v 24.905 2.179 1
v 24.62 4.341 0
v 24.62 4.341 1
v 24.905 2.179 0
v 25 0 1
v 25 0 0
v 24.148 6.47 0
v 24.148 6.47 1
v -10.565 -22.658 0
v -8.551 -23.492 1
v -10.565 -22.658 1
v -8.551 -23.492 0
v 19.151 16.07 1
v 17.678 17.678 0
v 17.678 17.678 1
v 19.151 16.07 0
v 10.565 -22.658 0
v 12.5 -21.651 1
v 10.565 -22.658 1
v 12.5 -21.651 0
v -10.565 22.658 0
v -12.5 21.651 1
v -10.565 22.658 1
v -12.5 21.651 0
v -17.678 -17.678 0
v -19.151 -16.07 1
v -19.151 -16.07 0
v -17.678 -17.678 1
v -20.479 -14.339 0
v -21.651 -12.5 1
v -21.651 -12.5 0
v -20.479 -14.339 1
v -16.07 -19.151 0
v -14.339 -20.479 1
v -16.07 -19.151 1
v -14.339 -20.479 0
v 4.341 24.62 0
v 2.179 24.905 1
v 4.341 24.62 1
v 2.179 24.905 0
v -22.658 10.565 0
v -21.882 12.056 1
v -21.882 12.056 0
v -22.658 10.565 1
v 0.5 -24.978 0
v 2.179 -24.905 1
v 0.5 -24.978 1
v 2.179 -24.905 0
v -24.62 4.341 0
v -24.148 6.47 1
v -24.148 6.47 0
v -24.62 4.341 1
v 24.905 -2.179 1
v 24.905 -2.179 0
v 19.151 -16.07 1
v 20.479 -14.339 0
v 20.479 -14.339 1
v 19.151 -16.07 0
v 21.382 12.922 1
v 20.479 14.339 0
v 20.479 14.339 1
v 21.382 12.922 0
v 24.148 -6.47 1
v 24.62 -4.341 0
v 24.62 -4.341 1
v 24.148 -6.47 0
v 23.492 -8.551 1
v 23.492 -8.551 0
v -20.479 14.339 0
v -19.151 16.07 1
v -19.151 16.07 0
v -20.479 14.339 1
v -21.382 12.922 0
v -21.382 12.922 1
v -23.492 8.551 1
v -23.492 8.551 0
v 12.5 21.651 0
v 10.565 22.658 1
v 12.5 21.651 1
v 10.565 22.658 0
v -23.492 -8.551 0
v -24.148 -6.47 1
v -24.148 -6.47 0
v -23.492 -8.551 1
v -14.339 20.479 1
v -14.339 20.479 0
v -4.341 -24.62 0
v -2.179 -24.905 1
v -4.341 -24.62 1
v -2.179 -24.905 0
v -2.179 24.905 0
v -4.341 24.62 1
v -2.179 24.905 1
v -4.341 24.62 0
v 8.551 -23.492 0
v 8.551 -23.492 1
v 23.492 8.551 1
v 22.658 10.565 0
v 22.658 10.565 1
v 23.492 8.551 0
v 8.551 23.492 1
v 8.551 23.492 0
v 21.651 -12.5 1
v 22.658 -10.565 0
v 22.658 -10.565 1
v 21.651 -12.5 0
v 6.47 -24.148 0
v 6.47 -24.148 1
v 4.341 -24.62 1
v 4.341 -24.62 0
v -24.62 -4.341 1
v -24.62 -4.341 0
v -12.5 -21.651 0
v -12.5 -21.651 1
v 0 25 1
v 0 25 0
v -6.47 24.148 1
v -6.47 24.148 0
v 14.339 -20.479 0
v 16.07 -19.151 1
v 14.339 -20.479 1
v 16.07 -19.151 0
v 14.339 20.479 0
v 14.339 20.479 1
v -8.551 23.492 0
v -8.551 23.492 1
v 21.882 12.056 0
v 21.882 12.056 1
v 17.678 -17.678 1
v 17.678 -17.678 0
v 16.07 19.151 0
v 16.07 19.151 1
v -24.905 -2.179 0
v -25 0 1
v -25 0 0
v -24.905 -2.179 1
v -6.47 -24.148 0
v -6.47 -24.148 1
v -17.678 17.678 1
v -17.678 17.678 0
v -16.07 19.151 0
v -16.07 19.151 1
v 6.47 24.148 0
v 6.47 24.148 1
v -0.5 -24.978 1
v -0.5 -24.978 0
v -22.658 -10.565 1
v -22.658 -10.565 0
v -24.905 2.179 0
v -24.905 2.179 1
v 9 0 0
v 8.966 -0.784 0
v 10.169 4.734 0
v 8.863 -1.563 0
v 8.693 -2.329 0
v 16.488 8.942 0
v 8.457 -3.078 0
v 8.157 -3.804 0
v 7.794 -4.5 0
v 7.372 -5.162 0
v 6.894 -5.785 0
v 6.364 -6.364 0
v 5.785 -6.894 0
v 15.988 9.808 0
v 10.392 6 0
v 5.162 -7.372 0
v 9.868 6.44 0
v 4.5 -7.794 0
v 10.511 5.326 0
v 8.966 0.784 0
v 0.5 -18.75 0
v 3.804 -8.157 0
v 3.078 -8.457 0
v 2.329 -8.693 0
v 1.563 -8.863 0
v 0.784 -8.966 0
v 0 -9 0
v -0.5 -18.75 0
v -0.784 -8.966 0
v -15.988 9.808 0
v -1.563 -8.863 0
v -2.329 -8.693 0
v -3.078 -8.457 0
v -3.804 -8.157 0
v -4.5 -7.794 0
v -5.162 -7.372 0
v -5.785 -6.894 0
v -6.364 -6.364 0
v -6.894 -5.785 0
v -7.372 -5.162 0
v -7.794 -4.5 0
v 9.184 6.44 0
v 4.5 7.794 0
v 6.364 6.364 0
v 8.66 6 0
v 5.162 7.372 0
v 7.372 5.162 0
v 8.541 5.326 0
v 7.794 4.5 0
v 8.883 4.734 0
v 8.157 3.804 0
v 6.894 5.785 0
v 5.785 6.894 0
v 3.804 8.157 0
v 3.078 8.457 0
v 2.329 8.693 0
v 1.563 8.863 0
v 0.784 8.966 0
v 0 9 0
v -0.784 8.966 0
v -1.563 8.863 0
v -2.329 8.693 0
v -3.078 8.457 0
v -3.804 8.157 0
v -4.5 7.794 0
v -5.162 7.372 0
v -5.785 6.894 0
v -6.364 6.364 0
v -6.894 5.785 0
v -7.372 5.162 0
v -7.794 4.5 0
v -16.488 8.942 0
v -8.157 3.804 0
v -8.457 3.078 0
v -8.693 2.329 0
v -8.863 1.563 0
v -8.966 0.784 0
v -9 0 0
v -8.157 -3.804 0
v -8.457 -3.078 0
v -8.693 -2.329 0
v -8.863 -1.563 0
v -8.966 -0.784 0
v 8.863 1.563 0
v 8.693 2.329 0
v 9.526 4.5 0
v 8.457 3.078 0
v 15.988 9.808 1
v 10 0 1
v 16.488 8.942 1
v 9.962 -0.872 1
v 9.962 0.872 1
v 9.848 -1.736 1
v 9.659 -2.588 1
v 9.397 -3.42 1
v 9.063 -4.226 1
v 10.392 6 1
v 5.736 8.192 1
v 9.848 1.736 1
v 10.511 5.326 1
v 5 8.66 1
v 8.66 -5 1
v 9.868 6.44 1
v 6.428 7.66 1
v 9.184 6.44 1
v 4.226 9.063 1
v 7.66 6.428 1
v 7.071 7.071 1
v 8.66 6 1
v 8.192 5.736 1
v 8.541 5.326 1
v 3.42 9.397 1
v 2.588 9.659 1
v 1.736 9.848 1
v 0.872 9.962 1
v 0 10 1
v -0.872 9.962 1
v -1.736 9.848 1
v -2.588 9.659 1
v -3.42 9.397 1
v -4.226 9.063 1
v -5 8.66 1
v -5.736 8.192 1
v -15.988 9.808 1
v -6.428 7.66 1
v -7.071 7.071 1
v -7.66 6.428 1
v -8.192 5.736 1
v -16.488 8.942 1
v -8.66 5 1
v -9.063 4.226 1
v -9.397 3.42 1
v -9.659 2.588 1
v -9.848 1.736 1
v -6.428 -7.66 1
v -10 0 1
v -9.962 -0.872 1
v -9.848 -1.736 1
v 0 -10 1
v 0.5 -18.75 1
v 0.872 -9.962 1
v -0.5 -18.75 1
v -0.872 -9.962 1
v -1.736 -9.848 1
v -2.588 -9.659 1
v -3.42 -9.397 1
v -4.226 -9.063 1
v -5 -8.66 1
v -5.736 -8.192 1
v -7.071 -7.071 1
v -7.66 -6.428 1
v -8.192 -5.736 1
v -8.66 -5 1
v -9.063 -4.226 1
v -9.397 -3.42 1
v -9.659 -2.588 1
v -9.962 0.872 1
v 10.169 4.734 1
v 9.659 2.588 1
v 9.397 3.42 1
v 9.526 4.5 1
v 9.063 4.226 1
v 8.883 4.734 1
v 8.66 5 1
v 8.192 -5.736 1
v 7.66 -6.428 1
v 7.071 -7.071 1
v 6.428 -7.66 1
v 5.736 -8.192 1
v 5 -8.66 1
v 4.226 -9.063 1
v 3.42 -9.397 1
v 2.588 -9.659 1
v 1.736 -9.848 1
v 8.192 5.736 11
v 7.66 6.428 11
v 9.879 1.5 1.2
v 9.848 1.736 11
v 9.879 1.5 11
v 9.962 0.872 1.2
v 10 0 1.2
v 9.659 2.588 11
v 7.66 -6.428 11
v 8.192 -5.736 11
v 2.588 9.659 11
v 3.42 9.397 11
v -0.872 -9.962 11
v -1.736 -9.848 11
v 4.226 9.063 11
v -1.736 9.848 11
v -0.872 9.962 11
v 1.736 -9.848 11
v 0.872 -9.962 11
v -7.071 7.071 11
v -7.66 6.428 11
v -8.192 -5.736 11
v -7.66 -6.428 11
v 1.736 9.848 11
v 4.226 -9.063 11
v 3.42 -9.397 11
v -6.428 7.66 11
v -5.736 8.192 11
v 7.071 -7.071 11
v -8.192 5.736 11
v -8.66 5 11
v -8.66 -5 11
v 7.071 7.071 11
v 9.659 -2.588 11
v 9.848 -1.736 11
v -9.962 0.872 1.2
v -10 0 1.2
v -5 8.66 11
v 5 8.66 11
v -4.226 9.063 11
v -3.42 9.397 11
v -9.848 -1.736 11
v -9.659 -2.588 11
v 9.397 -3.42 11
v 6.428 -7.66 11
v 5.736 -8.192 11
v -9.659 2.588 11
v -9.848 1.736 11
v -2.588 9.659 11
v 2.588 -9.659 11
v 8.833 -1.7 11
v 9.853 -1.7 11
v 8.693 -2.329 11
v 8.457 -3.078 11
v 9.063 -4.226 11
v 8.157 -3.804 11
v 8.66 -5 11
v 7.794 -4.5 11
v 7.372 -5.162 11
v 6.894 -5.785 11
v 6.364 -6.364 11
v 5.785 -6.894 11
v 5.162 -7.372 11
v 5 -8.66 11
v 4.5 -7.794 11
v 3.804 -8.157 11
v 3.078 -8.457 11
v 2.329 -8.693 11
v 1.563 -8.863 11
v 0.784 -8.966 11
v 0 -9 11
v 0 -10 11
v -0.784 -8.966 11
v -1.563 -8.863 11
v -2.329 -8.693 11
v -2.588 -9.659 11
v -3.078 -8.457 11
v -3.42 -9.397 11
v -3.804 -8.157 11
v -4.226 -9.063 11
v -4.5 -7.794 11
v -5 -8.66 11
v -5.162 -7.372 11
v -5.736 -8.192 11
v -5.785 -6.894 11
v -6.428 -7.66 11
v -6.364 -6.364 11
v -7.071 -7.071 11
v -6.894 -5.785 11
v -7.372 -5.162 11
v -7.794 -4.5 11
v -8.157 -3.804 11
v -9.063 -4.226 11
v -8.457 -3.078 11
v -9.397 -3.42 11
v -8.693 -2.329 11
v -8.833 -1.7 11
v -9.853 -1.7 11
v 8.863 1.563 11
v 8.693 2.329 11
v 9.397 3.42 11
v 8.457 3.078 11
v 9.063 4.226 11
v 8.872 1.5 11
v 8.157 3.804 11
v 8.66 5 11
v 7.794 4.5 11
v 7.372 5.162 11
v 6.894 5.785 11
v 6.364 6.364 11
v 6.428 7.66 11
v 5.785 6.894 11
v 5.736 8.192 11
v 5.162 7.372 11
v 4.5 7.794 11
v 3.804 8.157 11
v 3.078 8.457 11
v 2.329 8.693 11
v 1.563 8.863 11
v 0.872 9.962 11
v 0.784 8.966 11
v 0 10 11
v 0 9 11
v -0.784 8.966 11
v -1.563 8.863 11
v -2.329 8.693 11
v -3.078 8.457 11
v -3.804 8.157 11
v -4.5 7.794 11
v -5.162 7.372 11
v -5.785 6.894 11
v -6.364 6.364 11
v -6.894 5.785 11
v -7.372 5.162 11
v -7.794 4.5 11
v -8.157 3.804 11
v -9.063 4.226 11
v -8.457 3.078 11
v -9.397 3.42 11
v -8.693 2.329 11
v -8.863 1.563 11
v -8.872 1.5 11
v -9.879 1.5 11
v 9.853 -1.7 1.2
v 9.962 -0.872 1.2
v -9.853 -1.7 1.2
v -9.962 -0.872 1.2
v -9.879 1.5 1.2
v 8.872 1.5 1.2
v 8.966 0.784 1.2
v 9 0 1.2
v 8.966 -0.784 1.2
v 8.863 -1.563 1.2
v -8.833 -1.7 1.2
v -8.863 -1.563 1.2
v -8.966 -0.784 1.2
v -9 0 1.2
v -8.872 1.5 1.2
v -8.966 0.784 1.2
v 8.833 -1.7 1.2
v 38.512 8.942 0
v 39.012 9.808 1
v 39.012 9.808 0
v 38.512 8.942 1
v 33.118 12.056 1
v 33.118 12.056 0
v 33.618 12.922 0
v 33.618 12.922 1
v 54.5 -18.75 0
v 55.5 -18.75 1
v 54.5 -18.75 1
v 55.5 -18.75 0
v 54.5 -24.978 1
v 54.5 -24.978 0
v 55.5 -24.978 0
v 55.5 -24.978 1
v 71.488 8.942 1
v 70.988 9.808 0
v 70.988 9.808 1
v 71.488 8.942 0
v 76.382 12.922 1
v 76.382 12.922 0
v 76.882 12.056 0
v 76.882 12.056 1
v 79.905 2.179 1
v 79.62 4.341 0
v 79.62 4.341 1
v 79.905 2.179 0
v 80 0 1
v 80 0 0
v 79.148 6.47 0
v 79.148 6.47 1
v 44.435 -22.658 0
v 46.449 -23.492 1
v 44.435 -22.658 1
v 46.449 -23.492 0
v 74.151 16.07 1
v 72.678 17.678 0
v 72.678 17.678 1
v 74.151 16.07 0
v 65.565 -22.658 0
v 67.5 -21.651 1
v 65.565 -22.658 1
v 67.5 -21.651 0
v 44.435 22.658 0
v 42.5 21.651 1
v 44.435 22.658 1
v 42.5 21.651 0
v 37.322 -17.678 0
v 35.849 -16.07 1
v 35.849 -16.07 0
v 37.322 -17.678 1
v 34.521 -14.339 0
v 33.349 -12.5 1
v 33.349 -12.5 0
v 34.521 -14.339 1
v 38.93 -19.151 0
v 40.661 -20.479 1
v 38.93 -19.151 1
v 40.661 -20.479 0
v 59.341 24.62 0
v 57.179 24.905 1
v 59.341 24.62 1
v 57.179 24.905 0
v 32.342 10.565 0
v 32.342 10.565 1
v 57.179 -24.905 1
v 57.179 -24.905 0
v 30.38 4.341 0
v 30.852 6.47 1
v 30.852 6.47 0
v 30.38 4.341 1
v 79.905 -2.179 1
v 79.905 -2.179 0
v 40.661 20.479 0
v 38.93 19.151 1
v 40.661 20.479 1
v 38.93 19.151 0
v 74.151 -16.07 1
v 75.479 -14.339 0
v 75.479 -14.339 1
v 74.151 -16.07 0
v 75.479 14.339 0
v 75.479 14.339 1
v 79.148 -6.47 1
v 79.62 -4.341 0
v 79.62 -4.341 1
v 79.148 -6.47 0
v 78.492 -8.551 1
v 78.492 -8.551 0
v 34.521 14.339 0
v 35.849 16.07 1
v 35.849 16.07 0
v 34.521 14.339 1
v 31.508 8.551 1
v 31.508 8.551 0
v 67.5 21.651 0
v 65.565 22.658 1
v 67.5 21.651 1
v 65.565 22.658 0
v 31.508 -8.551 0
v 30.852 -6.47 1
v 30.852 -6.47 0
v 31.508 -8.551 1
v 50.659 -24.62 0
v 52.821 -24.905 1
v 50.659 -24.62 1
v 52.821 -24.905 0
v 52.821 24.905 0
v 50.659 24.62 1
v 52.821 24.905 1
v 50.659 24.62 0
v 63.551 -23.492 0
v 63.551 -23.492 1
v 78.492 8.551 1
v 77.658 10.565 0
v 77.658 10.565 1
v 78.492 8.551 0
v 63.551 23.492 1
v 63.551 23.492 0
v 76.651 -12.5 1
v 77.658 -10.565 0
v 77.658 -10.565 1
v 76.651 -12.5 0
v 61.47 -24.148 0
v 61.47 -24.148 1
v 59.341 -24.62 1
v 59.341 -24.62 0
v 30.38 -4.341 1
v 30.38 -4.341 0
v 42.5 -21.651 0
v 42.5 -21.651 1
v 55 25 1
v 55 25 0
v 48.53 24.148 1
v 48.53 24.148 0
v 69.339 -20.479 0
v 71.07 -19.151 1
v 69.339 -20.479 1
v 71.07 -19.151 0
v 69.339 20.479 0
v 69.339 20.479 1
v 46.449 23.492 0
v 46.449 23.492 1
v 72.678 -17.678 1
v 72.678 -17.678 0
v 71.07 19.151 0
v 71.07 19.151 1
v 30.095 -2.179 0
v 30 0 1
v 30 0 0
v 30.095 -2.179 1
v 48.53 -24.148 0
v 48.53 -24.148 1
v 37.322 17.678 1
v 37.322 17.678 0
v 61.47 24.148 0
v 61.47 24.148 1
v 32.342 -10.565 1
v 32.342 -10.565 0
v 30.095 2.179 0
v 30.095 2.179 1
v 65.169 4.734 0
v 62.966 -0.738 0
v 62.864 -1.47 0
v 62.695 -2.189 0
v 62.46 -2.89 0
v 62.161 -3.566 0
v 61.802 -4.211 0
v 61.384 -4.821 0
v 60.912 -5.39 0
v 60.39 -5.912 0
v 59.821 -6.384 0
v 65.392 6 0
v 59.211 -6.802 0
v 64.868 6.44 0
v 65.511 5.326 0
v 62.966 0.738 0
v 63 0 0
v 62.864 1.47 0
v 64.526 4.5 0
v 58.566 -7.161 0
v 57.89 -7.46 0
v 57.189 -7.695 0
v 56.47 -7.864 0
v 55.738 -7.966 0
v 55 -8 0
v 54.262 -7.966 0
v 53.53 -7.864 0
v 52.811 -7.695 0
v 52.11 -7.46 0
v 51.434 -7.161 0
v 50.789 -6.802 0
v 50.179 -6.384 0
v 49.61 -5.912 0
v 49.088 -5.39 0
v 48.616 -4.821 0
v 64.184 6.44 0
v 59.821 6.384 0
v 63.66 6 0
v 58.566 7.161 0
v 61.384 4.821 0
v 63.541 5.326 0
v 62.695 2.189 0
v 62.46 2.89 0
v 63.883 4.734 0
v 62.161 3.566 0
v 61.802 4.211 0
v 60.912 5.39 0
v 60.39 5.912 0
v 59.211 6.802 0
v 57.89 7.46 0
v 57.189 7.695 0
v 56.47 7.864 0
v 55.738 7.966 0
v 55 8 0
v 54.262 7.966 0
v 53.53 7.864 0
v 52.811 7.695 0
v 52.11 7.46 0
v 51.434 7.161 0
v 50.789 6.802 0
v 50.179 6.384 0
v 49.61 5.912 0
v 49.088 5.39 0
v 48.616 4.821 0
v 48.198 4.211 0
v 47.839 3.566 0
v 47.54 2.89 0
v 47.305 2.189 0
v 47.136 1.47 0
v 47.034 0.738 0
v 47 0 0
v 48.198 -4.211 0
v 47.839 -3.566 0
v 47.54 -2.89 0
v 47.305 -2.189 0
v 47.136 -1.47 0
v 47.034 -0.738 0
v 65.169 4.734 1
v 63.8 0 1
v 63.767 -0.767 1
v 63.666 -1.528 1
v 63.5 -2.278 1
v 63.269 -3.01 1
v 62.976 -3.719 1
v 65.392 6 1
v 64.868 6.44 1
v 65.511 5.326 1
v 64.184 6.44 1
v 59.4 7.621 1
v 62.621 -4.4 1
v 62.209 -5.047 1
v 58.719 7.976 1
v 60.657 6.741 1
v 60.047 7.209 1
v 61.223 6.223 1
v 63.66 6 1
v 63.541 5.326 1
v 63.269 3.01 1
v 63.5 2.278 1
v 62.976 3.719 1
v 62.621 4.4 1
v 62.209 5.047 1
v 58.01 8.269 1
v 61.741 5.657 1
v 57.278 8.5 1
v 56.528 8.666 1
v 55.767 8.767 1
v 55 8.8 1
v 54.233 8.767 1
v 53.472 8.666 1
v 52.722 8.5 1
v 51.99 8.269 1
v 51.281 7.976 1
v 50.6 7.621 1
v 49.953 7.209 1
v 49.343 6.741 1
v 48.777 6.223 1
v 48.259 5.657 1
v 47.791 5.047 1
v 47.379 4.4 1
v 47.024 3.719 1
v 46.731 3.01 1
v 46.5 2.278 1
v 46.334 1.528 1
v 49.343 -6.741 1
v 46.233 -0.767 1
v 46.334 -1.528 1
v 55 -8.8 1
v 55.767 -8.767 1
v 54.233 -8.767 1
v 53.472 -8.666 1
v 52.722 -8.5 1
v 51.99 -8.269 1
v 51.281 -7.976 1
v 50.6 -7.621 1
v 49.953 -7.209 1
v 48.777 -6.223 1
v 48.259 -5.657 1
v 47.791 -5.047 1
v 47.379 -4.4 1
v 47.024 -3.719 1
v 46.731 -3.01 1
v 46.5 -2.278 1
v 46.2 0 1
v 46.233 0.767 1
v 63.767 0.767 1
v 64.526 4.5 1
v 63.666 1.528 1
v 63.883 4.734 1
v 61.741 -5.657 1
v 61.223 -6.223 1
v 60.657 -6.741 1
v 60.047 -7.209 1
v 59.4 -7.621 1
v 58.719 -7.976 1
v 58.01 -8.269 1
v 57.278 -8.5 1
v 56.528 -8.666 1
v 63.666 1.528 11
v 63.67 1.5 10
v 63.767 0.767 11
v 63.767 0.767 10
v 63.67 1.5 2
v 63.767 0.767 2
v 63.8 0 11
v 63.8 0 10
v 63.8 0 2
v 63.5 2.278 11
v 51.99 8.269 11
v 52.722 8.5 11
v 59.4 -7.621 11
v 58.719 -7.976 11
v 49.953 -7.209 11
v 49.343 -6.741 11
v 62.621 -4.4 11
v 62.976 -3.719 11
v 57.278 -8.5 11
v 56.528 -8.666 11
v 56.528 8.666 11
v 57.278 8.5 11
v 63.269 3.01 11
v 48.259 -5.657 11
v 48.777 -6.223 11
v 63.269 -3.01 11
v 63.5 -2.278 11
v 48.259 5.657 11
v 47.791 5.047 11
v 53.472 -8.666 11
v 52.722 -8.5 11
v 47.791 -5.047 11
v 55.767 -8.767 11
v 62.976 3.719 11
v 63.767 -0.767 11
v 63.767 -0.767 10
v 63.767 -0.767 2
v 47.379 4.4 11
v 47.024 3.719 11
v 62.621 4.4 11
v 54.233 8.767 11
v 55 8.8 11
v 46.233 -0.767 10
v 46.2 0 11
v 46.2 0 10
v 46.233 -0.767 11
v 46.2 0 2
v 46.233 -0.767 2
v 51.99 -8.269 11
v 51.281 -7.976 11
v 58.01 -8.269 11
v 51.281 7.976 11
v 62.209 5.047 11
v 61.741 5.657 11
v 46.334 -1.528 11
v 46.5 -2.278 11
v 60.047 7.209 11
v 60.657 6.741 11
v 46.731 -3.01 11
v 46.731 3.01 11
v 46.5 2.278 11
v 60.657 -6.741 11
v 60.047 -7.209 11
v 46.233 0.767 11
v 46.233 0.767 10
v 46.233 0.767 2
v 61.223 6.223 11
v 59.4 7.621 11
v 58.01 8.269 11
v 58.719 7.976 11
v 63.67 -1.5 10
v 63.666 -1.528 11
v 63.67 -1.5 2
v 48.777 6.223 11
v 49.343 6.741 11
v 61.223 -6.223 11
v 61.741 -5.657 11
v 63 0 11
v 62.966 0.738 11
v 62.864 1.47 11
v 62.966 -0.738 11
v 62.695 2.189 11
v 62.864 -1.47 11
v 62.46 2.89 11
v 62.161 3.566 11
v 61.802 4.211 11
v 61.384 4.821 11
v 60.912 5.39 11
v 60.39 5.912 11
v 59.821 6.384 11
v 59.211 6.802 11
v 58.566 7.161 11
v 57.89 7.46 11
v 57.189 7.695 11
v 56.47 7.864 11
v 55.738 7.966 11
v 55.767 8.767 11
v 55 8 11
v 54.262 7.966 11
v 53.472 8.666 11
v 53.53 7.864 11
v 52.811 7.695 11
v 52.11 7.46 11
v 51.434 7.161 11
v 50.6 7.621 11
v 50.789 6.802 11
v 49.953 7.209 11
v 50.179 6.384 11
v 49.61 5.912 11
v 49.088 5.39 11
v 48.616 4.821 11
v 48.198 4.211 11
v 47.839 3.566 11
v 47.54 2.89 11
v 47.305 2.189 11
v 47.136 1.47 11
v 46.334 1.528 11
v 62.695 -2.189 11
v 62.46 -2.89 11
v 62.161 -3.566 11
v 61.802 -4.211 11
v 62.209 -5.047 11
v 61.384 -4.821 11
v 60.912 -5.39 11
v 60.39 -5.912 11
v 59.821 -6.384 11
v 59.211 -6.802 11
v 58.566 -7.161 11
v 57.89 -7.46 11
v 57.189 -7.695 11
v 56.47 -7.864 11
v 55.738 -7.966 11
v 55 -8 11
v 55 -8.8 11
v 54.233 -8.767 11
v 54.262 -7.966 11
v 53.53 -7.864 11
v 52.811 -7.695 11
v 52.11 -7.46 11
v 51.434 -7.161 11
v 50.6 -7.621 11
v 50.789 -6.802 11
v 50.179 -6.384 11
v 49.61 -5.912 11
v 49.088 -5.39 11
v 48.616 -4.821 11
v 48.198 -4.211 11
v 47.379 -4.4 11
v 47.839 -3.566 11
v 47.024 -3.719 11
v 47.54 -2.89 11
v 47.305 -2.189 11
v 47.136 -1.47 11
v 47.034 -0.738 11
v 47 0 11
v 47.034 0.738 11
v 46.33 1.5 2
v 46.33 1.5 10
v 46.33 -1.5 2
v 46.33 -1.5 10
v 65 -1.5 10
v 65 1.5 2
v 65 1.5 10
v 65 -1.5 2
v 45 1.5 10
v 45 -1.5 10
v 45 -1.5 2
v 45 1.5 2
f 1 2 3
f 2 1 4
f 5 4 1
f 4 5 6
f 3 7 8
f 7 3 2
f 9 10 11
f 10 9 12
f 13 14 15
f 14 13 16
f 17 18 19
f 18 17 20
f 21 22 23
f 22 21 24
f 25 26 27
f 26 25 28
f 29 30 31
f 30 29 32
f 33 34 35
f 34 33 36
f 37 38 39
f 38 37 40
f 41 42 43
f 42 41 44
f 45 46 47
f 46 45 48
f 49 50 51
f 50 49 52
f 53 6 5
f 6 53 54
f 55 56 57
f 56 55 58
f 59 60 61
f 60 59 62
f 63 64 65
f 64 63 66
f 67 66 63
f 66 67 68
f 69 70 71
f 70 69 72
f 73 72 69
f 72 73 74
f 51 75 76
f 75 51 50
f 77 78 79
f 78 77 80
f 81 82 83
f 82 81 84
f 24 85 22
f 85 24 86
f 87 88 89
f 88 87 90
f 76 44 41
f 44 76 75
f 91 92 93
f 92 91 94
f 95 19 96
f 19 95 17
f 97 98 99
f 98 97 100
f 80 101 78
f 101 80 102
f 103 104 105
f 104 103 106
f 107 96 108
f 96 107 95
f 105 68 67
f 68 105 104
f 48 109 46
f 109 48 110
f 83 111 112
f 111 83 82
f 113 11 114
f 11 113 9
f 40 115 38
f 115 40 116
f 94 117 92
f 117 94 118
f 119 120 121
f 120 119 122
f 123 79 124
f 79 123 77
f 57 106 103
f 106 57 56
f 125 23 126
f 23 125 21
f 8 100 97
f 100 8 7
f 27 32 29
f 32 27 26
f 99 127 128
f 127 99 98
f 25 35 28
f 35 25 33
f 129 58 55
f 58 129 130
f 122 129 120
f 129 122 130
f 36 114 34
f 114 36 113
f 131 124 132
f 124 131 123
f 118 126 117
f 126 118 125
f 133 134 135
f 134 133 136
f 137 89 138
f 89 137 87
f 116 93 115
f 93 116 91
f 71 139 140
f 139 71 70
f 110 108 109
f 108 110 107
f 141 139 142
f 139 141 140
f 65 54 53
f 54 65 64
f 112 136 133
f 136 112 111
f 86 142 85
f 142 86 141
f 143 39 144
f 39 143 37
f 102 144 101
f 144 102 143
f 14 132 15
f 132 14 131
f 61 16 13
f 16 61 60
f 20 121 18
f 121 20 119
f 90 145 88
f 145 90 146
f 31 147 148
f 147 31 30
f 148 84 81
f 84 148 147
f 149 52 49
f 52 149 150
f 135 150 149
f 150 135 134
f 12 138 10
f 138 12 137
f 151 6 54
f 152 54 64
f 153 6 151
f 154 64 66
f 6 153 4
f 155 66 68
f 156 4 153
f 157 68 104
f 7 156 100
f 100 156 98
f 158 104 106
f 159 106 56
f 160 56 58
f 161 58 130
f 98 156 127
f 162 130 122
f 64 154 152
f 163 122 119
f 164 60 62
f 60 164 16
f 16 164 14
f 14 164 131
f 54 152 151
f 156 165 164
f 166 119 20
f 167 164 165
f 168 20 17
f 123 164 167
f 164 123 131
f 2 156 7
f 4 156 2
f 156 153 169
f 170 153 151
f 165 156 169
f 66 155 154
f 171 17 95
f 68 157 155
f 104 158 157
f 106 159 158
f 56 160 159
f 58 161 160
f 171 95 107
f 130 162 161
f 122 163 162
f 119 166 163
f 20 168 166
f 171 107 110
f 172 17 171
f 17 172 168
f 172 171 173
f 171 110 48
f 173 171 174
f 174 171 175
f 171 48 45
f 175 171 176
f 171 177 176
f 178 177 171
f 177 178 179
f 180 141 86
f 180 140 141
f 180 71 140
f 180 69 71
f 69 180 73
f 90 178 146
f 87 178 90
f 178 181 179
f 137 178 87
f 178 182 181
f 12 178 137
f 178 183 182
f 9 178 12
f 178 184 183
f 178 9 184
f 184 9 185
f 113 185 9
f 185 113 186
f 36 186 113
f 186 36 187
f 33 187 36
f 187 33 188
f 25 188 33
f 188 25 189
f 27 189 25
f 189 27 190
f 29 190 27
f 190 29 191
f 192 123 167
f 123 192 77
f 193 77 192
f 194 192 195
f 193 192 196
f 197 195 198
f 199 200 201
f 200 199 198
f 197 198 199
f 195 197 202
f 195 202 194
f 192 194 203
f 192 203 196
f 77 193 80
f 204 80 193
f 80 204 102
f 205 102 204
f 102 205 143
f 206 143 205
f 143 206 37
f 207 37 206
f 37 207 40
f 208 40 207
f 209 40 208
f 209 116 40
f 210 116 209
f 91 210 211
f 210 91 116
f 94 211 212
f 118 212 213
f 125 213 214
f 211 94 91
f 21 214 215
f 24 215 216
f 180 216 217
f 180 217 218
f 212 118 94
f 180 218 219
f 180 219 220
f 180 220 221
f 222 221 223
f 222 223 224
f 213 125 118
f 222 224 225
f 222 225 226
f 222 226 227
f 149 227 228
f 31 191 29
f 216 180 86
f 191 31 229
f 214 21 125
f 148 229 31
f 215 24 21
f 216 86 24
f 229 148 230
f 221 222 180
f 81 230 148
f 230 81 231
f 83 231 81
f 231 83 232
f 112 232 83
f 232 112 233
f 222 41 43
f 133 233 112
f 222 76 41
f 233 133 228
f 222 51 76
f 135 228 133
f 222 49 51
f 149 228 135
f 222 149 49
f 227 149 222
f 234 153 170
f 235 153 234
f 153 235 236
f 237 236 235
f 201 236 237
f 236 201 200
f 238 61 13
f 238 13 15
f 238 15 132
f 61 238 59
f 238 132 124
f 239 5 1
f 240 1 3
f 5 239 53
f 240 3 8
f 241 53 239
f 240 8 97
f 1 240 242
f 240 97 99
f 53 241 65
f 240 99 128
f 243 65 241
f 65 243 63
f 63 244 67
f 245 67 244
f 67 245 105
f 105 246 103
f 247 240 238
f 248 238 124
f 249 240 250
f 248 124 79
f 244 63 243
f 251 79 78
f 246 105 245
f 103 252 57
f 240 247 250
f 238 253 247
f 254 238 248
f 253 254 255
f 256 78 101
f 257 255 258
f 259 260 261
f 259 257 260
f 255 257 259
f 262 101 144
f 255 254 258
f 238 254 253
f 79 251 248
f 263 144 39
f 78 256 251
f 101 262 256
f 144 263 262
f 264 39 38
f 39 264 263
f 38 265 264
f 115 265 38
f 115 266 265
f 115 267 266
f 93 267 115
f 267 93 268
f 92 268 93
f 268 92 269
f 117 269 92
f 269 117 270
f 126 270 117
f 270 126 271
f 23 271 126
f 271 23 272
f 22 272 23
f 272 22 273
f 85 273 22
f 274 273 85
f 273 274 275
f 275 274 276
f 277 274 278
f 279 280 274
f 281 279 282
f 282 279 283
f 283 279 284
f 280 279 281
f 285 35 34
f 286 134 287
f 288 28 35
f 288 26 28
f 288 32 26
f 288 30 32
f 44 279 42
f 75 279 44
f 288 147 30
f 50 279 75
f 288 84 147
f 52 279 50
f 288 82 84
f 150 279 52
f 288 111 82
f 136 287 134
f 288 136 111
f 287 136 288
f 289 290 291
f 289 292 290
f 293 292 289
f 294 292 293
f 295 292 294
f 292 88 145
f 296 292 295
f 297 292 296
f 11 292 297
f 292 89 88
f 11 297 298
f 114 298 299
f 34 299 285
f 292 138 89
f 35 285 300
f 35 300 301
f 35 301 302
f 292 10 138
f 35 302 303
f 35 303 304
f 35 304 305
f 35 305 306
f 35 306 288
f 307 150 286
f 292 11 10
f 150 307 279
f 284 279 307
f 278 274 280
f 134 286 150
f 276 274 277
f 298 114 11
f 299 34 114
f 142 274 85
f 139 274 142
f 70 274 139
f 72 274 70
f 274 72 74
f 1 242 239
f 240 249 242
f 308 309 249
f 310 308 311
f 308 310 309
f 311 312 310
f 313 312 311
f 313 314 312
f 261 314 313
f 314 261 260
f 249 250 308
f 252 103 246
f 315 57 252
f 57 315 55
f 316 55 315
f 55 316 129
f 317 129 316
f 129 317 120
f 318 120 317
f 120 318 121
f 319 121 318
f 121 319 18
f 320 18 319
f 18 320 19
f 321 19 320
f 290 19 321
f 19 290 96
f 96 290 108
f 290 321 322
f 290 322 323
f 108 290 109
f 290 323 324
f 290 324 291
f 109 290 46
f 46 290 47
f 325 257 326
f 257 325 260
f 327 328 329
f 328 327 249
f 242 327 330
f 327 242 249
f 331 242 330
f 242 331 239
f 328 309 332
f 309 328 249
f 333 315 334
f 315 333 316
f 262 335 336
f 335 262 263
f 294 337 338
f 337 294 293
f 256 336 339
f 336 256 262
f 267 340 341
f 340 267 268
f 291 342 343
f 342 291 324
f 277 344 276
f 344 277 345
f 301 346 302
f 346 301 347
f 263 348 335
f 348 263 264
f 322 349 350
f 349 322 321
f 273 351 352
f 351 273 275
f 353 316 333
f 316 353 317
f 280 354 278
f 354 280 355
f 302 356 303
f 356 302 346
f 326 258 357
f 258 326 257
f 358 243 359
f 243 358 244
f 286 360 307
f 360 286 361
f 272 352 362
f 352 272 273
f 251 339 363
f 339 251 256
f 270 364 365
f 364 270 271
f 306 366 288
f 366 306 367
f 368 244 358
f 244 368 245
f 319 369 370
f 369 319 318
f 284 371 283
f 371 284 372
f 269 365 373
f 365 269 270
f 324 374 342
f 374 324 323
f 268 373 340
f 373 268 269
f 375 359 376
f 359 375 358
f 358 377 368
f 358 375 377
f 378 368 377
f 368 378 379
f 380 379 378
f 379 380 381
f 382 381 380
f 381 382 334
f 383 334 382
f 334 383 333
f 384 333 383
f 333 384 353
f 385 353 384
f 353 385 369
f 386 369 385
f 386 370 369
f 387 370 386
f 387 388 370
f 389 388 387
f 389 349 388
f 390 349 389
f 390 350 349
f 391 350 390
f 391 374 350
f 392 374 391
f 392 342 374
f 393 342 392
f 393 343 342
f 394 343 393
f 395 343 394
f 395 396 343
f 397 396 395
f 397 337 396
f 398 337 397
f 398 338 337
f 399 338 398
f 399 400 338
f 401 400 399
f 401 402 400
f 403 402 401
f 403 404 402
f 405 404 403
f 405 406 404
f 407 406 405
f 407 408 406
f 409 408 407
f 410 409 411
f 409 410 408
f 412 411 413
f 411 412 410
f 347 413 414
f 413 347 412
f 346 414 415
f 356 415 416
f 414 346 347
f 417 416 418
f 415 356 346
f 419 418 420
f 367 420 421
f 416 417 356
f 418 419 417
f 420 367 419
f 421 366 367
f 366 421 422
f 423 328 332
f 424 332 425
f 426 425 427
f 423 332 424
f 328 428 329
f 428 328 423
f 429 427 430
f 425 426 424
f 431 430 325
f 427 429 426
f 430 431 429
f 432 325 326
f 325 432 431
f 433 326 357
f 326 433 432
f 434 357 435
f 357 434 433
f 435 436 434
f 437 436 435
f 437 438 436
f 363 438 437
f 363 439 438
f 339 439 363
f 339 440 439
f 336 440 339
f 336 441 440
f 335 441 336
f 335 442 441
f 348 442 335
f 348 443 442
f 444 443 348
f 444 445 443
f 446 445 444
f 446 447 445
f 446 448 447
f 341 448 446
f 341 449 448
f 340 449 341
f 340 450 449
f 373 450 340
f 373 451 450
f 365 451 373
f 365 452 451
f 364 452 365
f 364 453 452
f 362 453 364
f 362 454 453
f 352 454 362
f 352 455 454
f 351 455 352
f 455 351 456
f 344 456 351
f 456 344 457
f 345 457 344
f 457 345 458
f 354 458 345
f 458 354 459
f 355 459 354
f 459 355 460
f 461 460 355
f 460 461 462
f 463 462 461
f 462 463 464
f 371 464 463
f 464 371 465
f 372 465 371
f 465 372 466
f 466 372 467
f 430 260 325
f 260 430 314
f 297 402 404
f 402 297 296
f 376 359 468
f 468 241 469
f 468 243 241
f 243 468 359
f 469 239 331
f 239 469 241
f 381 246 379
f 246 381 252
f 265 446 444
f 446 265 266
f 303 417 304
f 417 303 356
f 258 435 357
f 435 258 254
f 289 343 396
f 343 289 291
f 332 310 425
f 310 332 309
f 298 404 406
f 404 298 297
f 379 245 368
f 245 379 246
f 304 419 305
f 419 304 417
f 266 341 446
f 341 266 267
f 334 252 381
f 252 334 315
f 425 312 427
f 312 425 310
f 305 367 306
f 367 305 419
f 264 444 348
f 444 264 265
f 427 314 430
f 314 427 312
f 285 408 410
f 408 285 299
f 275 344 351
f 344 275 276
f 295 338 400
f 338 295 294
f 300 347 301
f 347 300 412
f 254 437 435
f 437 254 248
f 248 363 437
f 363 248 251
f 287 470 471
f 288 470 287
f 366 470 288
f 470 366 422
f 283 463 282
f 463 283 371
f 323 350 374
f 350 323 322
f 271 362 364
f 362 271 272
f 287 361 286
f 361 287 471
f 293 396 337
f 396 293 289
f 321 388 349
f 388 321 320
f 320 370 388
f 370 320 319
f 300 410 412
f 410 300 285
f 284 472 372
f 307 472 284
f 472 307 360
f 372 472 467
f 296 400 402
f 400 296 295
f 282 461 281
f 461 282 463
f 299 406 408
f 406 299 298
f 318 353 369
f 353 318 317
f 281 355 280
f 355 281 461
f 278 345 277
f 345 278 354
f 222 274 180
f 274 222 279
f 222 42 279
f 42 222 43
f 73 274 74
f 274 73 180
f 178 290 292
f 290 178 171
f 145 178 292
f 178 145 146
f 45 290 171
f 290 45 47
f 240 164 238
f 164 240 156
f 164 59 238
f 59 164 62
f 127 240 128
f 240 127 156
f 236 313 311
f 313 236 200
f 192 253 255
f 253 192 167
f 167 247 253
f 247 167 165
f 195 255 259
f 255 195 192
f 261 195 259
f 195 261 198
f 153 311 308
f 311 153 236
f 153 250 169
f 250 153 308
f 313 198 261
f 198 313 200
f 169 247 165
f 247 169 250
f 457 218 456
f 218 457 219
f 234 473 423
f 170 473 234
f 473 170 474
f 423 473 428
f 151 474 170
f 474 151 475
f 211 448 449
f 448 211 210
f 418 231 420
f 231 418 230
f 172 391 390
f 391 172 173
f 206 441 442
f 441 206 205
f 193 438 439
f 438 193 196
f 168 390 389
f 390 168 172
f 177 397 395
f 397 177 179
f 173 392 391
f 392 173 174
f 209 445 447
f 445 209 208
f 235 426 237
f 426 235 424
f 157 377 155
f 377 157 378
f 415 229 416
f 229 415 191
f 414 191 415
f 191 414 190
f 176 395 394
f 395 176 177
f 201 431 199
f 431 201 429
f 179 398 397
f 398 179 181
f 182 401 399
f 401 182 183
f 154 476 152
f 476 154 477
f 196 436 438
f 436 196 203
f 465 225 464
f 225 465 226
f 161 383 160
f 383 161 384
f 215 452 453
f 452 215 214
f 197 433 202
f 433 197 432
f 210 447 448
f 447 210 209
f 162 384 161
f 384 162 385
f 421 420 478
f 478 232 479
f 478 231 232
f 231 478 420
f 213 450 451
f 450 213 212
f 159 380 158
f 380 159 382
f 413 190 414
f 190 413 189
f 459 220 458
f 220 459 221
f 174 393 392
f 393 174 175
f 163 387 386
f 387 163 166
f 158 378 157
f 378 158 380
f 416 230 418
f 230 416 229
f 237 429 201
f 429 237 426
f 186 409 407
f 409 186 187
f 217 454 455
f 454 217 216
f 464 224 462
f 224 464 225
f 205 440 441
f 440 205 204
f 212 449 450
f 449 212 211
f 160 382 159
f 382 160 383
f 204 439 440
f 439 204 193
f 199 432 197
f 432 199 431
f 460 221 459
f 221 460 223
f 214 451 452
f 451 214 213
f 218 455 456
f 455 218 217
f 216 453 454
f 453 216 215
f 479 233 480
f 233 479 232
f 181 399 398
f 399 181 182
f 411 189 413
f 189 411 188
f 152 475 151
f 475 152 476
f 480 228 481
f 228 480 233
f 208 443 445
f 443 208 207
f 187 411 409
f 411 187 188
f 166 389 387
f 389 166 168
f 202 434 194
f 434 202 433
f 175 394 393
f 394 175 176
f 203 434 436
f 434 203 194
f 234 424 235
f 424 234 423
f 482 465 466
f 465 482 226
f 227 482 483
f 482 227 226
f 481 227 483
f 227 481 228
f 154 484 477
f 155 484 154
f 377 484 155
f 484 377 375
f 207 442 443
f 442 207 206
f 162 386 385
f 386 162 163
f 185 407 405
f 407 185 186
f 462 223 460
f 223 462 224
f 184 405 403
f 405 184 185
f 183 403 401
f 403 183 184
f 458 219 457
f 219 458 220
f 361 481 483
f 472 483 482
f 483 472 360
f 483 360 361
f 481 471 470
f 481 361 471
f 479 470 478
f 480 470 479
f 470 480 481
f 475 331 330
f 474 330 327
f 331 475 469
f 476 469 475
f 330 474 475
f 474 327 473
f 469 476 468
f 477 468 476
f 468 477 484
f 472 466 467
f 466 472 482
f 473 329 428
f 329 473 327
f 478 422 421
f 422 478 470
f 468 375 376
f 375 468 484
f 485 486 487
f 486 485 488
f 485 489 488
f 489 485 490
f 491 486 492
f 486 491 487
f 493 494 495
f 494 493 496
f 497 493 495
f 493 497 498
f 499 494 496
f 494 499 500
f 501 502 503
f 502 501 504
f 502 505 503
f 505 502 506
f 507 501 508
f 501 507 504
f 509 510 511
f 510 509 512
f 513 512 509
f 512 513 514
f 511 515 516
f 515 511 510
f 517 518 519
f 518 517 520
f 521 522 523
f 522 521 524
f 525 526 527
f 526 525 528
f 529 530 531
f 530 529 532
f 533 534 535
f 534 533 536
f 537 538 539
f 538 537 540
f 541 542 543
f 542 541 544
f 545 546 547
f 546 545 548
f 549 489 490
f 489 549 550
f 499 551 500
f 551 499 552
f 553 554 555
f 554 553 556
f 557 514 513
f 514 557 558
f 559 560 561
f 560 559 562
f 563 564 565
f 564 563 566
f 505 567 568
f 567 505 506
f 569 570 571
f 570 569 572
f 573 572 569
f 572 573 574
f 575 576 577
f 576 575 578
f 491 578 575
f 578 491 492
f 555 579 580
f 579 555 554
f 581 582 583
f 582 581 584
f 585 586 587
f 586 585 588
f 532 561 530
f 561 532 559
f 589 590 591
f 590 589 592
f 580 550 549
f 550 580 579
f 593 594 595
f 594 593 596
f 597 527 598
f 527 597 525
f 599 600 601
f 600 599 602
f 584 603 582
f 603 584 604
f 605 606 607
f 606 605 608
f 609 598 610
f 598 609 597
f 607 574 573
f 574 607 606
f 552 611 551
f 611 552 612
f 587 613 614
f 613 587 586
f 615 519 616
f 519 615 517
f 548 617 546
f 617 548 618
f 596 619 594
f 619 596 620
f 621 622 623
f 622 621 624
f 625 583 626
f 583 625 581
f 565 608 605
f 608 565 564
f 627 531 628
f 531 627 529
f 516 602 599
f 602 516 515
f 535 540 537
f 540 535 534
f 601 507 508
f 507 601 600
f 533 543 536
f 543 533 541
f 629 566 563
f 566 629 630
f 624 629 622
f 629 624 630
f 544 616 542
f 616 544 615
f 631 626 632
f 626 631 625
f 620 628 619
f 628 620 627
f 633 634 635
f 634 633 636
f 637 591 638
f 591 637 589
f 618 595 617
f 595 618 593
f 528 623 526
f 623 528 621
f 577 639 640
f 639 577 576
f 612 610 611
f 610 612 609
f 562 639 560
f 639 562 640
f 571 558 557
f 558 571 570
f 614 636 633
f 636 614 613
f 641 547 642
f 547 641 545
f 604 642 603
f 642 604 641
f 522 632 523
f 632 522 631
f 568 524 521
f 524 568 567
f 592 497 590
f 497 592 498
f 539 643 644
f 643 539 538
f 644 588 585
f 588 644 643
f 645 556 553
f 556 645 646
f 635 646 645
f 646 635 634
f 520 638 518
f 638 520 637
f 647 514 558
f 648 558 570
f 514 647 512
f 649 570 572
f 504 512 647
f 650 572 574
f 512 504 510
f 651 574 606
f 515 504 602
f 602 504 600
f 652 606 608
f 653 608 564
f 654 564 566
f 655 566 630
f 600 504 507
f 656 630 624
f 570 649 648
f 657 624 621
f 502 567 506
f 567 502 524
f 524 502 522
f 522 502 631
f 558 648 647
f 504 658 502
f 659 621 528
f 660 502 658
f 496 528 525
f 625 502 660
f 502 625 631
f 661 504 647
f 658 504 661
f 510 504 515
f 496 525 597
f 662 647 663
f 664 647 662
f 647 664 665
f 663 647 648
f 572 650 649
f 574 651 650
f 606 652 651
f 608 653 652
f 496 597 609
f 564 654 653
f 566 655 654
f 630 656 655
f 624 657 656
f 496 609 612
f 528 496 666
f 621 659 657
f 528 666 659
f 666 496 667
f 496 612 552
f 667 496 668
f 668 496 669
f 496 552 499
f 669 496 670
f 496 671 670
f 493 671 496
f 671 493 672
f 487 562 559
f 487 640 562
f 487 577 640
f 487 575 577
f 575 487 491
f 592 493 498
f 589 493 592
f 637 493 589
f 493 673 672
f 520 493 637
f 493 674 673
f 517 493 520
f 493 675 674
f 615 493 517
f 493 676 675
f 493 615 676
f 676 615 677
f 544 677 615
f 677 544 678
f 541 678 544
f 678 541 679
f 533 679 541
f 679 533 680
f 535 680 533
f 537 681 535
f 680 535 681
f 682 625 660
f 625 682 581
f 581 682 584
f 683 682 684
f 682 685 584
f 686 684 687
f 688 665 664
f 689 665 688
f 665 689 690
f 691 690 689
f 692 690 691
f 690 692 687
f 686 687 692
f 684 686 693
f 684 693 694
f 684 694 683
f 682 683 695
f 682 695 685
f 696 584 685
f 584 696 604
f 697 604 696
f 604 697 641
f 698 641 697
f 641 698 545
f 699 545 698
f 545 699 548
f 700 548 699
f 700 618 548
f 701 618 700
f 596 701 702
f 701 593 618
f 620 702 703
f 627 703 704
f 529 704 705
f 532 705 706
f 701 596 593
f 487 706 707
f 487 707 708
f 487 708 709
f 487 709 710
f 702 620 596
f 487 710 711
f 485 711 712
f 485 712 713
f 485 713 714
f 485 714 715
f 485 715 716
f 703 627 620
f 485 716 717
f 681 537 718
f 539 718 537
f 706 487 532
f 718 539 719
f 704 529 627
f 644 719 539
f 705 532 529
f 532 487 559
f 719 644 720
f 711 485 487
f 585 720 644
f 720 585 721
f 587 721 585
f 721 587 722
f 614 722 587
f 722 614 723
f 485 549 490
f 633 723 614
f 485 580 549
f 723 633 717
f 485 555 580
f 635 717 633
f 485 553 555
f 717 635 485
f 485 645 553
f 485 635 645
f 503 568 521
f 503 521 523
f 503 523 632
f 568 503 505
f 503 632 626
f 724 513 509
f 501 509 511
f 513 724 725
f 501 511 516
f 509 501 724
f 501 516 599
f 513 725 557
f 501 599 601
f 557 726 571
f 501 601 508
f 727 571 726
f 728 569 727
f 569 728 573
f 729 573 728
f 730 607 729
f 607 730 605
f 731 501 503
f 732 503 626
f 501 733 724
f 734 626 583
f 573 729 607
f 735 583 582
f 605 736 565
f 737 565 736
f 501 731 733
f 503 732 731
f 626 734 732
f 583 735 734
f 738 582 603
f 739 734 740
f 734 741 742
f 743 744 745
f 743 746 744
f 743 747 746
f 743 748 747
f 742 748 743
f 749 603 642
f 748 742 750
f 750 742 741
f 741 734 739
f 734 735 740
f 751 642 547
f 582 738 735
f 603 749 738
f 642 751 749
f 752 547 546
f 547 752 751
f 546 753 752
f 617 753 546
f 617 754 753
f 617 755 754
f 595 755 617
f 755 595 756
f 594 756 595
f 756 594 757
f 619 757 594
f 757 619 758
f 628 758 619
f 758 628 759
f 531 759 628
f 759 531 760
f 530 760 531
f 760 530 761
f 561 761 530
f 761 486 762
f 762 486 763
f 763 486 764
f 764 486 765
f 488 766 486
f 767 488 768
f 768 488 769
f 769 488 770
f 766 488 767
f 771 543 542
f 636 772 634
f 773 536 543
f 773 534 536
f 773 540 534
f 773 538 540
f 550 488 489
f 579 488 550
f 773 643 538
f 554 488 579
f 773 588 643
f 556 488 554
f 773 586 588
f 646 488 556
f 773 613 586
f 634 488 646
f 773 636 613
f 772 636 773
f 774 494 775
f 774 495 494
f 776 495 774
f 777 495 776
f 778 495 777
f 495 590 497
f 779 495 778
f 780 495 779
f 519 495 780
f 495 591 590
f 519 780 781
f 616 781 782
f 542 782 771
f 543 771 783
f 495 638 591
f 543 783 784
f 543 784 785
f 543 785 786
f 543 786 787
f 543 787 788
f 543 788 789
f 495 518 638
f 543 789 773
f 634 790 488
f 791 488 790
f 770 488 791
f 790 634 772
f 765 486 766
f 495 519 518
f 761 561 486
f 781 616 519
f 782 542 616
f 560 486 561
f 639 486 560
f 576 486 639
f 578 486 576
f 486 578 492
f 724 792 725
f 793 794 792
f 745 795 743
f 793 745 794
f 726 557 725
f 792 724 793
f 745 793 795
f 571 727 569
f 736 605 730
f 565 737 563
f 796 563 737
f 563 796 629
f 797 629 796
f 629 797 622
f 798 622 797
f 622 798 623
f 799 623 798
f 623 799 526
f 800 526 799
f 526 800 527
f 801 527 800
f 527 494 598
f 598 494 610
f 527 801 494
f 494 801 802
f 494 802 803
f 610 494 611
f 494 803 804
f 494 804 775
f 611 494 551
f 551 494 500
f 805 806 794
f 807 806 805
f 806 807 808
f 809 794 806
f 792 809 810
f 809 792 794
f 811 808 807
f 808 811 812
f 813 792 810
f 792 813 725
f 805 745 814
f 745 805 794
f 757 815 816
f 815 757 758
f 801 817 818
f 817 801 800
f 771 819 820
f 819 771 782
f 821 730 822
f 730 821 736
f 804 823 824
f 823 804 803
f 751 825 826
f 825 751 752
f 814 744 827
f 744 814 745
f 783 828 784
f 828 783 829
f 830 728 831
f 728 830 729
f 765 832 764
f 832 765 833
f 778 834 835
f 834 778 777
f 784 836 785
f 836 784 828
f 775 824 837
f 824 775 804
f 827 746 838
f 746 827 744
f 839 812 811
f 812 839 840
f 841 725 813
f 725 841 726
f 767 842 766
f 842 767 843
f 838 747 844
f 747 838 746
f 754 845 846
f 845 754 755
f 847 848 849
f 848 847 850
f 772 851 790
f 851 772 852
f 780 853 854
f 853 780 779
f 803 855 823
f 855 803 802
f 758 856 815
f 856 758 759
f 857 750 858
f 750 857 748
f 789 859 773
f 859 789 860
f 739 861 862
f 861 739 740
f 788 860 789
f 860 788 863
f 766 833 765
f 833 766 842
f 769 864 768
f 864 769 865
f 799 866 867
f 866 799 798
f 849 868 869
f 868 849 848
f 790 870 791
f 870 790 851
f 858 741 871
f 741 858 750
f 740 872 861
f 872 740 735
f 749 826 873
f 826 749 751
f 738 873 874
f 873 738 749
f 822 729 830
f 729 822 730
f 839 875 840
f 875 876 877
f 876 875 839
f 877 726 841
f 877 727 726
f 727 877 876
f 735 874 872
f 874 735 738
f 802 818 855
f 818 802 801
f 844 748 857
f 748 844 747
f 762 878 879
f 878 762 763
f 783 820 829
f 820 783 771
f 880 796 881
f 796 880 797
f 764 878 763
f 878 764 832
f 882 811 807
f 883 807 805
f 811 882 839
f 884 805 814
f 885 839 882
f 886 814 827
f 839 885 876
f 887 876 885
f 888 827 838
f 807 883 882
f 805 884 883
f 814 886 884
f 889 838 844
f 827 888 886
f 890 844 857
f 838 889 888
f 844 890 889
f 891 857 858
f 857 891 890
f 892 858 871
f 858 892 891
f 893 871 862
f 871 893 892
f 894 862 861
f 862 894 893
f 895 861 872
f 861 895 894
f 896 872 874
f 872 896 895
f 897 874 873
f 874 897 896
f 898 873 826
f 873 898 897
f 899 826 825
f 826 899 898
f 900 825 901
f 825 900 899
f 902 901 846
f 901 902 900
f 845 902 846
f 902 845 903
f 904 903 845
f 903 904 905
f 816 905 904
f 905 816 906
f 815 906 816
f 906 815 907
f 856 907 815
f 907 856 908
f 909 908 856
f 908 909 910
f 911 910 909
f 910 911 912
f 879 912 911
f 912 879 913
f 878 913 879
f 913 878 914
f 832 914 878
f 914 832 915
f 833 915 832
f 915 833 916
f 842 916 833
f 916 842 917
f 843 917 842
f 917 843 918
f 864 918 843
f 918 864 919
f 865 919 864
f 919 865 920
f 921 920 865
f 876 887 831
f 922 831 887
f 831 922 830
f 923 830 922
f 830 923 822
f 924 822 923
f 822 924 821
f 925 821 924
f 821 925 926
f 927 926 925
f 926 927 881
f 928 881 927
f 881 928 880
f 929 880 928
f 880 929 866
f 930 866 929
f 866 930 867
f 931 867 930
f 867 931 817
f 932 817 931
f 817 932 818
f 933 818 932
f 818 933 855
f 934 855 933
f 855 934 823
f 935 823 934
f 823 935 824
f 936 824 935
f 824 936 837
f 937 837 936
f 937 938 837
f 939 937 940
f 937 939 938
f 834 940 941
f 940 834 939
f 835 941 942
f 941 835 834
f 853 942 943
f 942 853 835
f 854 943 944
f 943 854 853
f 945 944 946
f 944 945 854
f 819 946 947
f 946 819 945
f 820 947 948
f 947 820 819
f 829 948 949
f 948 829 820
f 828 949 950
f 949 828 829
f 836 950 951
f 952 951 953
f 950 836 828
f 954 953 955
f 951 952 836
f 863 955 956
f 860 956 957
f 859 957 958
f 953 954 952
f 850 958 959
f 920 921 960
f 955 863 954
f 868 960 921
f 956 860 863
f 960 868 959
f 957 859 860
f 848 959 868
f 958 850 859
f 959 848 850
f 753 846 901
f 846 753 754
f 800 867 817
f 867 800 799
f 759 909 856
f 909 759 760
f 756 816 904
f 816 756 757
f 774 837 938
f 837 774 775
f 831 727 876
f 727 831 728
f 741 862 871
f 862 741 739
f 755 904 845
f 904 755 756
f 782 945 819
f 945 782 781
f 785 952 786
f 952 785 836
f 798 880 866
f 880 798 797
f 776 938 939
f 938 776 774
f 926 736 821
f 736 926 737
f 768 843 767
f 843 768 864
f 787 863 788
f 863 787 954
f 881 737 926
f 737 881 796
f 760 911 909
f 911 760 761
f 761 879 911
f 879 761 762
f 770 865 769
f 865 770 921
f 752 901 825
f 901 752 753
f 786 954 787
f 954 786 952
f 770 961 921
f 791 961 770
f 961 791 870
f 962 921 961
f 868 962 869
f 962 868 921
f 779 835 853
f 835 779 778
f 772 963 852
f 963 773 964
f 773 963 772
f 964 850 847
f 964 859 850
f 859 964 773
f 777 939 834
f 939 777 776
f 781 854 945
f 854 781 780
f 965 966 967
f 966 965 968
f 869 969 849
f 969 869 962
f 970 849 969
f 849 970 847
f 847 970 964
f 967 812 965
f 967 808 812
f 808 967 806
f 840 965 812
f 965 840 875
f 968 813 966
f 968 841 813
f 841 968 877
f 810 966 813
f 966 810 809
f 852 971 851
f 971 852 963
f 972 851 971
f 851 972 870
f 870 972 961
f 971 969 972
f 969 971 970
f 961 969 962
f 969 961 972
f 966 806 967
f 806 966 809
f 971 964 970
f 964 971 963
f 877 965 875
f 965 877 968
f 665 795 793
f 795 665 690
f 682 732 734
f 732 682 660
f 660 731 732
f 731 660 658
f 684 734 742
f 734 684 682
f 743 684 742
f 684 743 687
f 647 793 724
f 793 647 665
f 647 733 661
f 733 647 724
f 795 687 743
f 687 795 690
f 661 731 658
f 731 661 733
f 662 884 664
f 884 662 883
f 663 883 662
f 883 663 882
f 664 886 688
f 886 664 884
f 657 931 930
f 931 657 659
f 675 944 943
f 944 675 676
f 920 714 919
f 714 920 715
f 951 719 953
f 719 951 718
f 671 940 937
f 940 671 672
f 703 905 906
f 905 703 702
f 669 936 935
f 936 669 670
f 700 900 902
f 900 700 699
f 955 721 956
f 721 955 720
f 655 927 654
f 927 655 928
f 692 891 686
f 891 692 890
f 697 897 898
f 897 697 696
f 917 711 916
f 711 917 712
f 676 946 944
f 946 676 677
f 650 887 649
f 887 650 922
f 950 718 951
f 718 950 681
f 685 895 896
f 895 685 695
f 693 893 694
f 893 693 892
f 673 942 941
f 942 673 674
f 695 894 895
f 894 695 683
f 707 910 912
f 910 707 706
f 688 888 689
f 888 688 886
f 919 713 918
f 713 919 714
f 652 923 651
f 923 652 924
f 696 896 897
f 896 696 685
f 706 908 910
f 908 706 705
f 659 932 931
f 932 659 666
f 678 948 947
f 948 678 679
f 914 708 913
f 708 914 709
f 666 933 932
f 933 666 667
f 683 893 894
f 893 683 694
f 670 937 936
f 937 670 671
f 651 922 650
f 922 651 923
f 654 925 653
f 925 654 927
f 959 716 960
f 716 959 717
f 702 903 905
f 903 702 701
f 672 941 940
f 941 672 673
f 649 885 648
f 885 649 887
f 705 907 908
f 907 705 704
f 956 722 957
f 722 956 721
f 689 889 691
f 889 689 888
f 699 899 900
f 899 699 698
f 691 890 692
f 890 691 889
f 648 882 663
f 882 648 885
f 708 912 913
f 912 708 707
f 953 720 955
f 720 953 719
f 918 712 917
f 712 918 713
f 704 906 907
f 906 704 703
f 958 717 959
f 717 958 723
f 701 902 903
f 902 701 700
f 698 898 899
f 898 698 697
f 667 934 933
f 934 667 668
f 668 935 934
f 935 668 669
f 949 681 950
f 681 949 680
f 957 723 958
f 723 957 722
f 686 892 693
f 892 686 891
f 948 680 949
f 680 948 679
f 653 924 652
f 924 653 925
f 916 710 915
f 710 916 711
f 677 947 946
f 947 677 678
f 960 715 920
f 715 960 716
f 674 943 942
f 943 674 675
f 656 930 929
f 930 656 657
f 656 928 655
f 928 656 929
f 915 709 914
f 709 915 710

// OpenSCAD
/*
Author: Avp (Alexander Purikov)
Design is based on Ben Wittbrodt one: http://www.thingiverse.com/thing:435802
*/

/*[Customizer Variables]*/

//Which part would you like to render?
part			=	"both"; //[top:Top, bottom:Bottom, both:Both]
//Diameter of the outer guard for the spooler
big_diameter	=	50;	//[40:160]
//Thickness of the flange and spool walls
flange_thick	=	1;	//[1:4]	
//Diameter of the middle spool cylinder
cylinder_diameter	=	20;	//[10:40]
//Width of the winding area (where the wire will be)
winding_thick	=	10;	//[5:50]
//Width of the slots and holes for fastening wire ends
gaps_width		=	1; //[0:3]
//Diameter of the circle cutouts on outer guard
cut_diameter	=	0;	//[0:9]


/*[hidden]*/
$fa=5; $fs=0.75;
Clearance = 0.2;


big_radius = big_diameter/2;
small_radius = (cylinder_diameter-flange_thick*2)/2;
cut_radius = cut_diameter/2;

output();

module output()
{
	if (part == "top") {
		top();
	} else if (part == "bottom") {
		bottom();
	} else if (part == "both") {
		top();
		translate([big_radius*2+5,0,0])
		bottom();
	} 
}

module top()
{
	difference()
	{
		union()
		{
			cylinder(r=big_radius, h=flange_thick); //Outer flange

			cylinder(r=small_radius+flange_thick, h=flange_thick+winding_thick);	//Inner cylinder
		}

		for (i=[1:6])
		{
			rotate([0,0,60*i])
			translate([big_radius/2+cut_radius,0,-.1])
				cylinder(r=cut_radius,h=flange_thick+.2); //Flange cutouts
		}
		for (i=[1:3])
		{
			rotate([0,0,120*i+30])
				translate ([big_radius,0,0])
					cube ([big_radius/2,gaps_width,flange_thick*2+0.2], center=true);
		}

		if ( gaps_width > 0 )
		{
			rotate([0,0,30])
					translate ([small_radius+2/2+flange_thick,0,-0.1])
						cylinder ( r=(gaps_width<2) ? 1 : gaps_width/2, h=flange_thick+0.2 );
			
			translate([0,0,-.15])
				cylinder(r=small_radius, h=winding_thick+flange_thick*2+0.2);	//inner radius cutout
		}
		translate([-small_radius-flange_thick,-1.7,flange_thick*1+0.2])
			cube([small_radius*2+(2*flange_thick)+Clearance,3.2,winding_thick]);		//locking slot
	}
}

module bottom()
{
	difference()
	{
		union()
		{
			cylinder(r=big_radius, h=flange_thick);	//Outer flange
			cylinder(r=small_radius-Clearance, h=flange_thick+winding_thick);	//Inner cylinder

			translate([-small_radius-flange_thick,-1.5,flange_thick*2])
				cube([small_radius*2+(2*flange_thick),3,winding_thick-(flange_thick*2)]);  //locking tabs
		}

		for (i=[1:6])
		{
			rotate([0,0,60*i])
			translate([big_radius/2+cut_radius,0,-.1])
				cylinder(r=cut_radius,h=flange_thick+.2); //Flange cutouts
		}

		if ( gaps_width > 0 )
		{
			for (i=[1:3])
			{
				rotate([0,0,120*i+30])
					translate ([big_radius,0,0])
						cube ([big_radius/2,gaps_width,flange_thick*2+0.2], center=true);
			}
			
			rotate([0,0,30])
					translate ([small_radius+2/2+flange_thick,0,-0.1])
						cylinder ( r=(gaps_width<2) ? 1 : gaps_width/2, h=flange_thick+0.2 );
			}
		translate([0,0,-.15])
		cylinder(r=small_radius-flange_thick, h=winding_thick+flange_thick*2+0.2); //Inner cylinder cutout
	}
}
